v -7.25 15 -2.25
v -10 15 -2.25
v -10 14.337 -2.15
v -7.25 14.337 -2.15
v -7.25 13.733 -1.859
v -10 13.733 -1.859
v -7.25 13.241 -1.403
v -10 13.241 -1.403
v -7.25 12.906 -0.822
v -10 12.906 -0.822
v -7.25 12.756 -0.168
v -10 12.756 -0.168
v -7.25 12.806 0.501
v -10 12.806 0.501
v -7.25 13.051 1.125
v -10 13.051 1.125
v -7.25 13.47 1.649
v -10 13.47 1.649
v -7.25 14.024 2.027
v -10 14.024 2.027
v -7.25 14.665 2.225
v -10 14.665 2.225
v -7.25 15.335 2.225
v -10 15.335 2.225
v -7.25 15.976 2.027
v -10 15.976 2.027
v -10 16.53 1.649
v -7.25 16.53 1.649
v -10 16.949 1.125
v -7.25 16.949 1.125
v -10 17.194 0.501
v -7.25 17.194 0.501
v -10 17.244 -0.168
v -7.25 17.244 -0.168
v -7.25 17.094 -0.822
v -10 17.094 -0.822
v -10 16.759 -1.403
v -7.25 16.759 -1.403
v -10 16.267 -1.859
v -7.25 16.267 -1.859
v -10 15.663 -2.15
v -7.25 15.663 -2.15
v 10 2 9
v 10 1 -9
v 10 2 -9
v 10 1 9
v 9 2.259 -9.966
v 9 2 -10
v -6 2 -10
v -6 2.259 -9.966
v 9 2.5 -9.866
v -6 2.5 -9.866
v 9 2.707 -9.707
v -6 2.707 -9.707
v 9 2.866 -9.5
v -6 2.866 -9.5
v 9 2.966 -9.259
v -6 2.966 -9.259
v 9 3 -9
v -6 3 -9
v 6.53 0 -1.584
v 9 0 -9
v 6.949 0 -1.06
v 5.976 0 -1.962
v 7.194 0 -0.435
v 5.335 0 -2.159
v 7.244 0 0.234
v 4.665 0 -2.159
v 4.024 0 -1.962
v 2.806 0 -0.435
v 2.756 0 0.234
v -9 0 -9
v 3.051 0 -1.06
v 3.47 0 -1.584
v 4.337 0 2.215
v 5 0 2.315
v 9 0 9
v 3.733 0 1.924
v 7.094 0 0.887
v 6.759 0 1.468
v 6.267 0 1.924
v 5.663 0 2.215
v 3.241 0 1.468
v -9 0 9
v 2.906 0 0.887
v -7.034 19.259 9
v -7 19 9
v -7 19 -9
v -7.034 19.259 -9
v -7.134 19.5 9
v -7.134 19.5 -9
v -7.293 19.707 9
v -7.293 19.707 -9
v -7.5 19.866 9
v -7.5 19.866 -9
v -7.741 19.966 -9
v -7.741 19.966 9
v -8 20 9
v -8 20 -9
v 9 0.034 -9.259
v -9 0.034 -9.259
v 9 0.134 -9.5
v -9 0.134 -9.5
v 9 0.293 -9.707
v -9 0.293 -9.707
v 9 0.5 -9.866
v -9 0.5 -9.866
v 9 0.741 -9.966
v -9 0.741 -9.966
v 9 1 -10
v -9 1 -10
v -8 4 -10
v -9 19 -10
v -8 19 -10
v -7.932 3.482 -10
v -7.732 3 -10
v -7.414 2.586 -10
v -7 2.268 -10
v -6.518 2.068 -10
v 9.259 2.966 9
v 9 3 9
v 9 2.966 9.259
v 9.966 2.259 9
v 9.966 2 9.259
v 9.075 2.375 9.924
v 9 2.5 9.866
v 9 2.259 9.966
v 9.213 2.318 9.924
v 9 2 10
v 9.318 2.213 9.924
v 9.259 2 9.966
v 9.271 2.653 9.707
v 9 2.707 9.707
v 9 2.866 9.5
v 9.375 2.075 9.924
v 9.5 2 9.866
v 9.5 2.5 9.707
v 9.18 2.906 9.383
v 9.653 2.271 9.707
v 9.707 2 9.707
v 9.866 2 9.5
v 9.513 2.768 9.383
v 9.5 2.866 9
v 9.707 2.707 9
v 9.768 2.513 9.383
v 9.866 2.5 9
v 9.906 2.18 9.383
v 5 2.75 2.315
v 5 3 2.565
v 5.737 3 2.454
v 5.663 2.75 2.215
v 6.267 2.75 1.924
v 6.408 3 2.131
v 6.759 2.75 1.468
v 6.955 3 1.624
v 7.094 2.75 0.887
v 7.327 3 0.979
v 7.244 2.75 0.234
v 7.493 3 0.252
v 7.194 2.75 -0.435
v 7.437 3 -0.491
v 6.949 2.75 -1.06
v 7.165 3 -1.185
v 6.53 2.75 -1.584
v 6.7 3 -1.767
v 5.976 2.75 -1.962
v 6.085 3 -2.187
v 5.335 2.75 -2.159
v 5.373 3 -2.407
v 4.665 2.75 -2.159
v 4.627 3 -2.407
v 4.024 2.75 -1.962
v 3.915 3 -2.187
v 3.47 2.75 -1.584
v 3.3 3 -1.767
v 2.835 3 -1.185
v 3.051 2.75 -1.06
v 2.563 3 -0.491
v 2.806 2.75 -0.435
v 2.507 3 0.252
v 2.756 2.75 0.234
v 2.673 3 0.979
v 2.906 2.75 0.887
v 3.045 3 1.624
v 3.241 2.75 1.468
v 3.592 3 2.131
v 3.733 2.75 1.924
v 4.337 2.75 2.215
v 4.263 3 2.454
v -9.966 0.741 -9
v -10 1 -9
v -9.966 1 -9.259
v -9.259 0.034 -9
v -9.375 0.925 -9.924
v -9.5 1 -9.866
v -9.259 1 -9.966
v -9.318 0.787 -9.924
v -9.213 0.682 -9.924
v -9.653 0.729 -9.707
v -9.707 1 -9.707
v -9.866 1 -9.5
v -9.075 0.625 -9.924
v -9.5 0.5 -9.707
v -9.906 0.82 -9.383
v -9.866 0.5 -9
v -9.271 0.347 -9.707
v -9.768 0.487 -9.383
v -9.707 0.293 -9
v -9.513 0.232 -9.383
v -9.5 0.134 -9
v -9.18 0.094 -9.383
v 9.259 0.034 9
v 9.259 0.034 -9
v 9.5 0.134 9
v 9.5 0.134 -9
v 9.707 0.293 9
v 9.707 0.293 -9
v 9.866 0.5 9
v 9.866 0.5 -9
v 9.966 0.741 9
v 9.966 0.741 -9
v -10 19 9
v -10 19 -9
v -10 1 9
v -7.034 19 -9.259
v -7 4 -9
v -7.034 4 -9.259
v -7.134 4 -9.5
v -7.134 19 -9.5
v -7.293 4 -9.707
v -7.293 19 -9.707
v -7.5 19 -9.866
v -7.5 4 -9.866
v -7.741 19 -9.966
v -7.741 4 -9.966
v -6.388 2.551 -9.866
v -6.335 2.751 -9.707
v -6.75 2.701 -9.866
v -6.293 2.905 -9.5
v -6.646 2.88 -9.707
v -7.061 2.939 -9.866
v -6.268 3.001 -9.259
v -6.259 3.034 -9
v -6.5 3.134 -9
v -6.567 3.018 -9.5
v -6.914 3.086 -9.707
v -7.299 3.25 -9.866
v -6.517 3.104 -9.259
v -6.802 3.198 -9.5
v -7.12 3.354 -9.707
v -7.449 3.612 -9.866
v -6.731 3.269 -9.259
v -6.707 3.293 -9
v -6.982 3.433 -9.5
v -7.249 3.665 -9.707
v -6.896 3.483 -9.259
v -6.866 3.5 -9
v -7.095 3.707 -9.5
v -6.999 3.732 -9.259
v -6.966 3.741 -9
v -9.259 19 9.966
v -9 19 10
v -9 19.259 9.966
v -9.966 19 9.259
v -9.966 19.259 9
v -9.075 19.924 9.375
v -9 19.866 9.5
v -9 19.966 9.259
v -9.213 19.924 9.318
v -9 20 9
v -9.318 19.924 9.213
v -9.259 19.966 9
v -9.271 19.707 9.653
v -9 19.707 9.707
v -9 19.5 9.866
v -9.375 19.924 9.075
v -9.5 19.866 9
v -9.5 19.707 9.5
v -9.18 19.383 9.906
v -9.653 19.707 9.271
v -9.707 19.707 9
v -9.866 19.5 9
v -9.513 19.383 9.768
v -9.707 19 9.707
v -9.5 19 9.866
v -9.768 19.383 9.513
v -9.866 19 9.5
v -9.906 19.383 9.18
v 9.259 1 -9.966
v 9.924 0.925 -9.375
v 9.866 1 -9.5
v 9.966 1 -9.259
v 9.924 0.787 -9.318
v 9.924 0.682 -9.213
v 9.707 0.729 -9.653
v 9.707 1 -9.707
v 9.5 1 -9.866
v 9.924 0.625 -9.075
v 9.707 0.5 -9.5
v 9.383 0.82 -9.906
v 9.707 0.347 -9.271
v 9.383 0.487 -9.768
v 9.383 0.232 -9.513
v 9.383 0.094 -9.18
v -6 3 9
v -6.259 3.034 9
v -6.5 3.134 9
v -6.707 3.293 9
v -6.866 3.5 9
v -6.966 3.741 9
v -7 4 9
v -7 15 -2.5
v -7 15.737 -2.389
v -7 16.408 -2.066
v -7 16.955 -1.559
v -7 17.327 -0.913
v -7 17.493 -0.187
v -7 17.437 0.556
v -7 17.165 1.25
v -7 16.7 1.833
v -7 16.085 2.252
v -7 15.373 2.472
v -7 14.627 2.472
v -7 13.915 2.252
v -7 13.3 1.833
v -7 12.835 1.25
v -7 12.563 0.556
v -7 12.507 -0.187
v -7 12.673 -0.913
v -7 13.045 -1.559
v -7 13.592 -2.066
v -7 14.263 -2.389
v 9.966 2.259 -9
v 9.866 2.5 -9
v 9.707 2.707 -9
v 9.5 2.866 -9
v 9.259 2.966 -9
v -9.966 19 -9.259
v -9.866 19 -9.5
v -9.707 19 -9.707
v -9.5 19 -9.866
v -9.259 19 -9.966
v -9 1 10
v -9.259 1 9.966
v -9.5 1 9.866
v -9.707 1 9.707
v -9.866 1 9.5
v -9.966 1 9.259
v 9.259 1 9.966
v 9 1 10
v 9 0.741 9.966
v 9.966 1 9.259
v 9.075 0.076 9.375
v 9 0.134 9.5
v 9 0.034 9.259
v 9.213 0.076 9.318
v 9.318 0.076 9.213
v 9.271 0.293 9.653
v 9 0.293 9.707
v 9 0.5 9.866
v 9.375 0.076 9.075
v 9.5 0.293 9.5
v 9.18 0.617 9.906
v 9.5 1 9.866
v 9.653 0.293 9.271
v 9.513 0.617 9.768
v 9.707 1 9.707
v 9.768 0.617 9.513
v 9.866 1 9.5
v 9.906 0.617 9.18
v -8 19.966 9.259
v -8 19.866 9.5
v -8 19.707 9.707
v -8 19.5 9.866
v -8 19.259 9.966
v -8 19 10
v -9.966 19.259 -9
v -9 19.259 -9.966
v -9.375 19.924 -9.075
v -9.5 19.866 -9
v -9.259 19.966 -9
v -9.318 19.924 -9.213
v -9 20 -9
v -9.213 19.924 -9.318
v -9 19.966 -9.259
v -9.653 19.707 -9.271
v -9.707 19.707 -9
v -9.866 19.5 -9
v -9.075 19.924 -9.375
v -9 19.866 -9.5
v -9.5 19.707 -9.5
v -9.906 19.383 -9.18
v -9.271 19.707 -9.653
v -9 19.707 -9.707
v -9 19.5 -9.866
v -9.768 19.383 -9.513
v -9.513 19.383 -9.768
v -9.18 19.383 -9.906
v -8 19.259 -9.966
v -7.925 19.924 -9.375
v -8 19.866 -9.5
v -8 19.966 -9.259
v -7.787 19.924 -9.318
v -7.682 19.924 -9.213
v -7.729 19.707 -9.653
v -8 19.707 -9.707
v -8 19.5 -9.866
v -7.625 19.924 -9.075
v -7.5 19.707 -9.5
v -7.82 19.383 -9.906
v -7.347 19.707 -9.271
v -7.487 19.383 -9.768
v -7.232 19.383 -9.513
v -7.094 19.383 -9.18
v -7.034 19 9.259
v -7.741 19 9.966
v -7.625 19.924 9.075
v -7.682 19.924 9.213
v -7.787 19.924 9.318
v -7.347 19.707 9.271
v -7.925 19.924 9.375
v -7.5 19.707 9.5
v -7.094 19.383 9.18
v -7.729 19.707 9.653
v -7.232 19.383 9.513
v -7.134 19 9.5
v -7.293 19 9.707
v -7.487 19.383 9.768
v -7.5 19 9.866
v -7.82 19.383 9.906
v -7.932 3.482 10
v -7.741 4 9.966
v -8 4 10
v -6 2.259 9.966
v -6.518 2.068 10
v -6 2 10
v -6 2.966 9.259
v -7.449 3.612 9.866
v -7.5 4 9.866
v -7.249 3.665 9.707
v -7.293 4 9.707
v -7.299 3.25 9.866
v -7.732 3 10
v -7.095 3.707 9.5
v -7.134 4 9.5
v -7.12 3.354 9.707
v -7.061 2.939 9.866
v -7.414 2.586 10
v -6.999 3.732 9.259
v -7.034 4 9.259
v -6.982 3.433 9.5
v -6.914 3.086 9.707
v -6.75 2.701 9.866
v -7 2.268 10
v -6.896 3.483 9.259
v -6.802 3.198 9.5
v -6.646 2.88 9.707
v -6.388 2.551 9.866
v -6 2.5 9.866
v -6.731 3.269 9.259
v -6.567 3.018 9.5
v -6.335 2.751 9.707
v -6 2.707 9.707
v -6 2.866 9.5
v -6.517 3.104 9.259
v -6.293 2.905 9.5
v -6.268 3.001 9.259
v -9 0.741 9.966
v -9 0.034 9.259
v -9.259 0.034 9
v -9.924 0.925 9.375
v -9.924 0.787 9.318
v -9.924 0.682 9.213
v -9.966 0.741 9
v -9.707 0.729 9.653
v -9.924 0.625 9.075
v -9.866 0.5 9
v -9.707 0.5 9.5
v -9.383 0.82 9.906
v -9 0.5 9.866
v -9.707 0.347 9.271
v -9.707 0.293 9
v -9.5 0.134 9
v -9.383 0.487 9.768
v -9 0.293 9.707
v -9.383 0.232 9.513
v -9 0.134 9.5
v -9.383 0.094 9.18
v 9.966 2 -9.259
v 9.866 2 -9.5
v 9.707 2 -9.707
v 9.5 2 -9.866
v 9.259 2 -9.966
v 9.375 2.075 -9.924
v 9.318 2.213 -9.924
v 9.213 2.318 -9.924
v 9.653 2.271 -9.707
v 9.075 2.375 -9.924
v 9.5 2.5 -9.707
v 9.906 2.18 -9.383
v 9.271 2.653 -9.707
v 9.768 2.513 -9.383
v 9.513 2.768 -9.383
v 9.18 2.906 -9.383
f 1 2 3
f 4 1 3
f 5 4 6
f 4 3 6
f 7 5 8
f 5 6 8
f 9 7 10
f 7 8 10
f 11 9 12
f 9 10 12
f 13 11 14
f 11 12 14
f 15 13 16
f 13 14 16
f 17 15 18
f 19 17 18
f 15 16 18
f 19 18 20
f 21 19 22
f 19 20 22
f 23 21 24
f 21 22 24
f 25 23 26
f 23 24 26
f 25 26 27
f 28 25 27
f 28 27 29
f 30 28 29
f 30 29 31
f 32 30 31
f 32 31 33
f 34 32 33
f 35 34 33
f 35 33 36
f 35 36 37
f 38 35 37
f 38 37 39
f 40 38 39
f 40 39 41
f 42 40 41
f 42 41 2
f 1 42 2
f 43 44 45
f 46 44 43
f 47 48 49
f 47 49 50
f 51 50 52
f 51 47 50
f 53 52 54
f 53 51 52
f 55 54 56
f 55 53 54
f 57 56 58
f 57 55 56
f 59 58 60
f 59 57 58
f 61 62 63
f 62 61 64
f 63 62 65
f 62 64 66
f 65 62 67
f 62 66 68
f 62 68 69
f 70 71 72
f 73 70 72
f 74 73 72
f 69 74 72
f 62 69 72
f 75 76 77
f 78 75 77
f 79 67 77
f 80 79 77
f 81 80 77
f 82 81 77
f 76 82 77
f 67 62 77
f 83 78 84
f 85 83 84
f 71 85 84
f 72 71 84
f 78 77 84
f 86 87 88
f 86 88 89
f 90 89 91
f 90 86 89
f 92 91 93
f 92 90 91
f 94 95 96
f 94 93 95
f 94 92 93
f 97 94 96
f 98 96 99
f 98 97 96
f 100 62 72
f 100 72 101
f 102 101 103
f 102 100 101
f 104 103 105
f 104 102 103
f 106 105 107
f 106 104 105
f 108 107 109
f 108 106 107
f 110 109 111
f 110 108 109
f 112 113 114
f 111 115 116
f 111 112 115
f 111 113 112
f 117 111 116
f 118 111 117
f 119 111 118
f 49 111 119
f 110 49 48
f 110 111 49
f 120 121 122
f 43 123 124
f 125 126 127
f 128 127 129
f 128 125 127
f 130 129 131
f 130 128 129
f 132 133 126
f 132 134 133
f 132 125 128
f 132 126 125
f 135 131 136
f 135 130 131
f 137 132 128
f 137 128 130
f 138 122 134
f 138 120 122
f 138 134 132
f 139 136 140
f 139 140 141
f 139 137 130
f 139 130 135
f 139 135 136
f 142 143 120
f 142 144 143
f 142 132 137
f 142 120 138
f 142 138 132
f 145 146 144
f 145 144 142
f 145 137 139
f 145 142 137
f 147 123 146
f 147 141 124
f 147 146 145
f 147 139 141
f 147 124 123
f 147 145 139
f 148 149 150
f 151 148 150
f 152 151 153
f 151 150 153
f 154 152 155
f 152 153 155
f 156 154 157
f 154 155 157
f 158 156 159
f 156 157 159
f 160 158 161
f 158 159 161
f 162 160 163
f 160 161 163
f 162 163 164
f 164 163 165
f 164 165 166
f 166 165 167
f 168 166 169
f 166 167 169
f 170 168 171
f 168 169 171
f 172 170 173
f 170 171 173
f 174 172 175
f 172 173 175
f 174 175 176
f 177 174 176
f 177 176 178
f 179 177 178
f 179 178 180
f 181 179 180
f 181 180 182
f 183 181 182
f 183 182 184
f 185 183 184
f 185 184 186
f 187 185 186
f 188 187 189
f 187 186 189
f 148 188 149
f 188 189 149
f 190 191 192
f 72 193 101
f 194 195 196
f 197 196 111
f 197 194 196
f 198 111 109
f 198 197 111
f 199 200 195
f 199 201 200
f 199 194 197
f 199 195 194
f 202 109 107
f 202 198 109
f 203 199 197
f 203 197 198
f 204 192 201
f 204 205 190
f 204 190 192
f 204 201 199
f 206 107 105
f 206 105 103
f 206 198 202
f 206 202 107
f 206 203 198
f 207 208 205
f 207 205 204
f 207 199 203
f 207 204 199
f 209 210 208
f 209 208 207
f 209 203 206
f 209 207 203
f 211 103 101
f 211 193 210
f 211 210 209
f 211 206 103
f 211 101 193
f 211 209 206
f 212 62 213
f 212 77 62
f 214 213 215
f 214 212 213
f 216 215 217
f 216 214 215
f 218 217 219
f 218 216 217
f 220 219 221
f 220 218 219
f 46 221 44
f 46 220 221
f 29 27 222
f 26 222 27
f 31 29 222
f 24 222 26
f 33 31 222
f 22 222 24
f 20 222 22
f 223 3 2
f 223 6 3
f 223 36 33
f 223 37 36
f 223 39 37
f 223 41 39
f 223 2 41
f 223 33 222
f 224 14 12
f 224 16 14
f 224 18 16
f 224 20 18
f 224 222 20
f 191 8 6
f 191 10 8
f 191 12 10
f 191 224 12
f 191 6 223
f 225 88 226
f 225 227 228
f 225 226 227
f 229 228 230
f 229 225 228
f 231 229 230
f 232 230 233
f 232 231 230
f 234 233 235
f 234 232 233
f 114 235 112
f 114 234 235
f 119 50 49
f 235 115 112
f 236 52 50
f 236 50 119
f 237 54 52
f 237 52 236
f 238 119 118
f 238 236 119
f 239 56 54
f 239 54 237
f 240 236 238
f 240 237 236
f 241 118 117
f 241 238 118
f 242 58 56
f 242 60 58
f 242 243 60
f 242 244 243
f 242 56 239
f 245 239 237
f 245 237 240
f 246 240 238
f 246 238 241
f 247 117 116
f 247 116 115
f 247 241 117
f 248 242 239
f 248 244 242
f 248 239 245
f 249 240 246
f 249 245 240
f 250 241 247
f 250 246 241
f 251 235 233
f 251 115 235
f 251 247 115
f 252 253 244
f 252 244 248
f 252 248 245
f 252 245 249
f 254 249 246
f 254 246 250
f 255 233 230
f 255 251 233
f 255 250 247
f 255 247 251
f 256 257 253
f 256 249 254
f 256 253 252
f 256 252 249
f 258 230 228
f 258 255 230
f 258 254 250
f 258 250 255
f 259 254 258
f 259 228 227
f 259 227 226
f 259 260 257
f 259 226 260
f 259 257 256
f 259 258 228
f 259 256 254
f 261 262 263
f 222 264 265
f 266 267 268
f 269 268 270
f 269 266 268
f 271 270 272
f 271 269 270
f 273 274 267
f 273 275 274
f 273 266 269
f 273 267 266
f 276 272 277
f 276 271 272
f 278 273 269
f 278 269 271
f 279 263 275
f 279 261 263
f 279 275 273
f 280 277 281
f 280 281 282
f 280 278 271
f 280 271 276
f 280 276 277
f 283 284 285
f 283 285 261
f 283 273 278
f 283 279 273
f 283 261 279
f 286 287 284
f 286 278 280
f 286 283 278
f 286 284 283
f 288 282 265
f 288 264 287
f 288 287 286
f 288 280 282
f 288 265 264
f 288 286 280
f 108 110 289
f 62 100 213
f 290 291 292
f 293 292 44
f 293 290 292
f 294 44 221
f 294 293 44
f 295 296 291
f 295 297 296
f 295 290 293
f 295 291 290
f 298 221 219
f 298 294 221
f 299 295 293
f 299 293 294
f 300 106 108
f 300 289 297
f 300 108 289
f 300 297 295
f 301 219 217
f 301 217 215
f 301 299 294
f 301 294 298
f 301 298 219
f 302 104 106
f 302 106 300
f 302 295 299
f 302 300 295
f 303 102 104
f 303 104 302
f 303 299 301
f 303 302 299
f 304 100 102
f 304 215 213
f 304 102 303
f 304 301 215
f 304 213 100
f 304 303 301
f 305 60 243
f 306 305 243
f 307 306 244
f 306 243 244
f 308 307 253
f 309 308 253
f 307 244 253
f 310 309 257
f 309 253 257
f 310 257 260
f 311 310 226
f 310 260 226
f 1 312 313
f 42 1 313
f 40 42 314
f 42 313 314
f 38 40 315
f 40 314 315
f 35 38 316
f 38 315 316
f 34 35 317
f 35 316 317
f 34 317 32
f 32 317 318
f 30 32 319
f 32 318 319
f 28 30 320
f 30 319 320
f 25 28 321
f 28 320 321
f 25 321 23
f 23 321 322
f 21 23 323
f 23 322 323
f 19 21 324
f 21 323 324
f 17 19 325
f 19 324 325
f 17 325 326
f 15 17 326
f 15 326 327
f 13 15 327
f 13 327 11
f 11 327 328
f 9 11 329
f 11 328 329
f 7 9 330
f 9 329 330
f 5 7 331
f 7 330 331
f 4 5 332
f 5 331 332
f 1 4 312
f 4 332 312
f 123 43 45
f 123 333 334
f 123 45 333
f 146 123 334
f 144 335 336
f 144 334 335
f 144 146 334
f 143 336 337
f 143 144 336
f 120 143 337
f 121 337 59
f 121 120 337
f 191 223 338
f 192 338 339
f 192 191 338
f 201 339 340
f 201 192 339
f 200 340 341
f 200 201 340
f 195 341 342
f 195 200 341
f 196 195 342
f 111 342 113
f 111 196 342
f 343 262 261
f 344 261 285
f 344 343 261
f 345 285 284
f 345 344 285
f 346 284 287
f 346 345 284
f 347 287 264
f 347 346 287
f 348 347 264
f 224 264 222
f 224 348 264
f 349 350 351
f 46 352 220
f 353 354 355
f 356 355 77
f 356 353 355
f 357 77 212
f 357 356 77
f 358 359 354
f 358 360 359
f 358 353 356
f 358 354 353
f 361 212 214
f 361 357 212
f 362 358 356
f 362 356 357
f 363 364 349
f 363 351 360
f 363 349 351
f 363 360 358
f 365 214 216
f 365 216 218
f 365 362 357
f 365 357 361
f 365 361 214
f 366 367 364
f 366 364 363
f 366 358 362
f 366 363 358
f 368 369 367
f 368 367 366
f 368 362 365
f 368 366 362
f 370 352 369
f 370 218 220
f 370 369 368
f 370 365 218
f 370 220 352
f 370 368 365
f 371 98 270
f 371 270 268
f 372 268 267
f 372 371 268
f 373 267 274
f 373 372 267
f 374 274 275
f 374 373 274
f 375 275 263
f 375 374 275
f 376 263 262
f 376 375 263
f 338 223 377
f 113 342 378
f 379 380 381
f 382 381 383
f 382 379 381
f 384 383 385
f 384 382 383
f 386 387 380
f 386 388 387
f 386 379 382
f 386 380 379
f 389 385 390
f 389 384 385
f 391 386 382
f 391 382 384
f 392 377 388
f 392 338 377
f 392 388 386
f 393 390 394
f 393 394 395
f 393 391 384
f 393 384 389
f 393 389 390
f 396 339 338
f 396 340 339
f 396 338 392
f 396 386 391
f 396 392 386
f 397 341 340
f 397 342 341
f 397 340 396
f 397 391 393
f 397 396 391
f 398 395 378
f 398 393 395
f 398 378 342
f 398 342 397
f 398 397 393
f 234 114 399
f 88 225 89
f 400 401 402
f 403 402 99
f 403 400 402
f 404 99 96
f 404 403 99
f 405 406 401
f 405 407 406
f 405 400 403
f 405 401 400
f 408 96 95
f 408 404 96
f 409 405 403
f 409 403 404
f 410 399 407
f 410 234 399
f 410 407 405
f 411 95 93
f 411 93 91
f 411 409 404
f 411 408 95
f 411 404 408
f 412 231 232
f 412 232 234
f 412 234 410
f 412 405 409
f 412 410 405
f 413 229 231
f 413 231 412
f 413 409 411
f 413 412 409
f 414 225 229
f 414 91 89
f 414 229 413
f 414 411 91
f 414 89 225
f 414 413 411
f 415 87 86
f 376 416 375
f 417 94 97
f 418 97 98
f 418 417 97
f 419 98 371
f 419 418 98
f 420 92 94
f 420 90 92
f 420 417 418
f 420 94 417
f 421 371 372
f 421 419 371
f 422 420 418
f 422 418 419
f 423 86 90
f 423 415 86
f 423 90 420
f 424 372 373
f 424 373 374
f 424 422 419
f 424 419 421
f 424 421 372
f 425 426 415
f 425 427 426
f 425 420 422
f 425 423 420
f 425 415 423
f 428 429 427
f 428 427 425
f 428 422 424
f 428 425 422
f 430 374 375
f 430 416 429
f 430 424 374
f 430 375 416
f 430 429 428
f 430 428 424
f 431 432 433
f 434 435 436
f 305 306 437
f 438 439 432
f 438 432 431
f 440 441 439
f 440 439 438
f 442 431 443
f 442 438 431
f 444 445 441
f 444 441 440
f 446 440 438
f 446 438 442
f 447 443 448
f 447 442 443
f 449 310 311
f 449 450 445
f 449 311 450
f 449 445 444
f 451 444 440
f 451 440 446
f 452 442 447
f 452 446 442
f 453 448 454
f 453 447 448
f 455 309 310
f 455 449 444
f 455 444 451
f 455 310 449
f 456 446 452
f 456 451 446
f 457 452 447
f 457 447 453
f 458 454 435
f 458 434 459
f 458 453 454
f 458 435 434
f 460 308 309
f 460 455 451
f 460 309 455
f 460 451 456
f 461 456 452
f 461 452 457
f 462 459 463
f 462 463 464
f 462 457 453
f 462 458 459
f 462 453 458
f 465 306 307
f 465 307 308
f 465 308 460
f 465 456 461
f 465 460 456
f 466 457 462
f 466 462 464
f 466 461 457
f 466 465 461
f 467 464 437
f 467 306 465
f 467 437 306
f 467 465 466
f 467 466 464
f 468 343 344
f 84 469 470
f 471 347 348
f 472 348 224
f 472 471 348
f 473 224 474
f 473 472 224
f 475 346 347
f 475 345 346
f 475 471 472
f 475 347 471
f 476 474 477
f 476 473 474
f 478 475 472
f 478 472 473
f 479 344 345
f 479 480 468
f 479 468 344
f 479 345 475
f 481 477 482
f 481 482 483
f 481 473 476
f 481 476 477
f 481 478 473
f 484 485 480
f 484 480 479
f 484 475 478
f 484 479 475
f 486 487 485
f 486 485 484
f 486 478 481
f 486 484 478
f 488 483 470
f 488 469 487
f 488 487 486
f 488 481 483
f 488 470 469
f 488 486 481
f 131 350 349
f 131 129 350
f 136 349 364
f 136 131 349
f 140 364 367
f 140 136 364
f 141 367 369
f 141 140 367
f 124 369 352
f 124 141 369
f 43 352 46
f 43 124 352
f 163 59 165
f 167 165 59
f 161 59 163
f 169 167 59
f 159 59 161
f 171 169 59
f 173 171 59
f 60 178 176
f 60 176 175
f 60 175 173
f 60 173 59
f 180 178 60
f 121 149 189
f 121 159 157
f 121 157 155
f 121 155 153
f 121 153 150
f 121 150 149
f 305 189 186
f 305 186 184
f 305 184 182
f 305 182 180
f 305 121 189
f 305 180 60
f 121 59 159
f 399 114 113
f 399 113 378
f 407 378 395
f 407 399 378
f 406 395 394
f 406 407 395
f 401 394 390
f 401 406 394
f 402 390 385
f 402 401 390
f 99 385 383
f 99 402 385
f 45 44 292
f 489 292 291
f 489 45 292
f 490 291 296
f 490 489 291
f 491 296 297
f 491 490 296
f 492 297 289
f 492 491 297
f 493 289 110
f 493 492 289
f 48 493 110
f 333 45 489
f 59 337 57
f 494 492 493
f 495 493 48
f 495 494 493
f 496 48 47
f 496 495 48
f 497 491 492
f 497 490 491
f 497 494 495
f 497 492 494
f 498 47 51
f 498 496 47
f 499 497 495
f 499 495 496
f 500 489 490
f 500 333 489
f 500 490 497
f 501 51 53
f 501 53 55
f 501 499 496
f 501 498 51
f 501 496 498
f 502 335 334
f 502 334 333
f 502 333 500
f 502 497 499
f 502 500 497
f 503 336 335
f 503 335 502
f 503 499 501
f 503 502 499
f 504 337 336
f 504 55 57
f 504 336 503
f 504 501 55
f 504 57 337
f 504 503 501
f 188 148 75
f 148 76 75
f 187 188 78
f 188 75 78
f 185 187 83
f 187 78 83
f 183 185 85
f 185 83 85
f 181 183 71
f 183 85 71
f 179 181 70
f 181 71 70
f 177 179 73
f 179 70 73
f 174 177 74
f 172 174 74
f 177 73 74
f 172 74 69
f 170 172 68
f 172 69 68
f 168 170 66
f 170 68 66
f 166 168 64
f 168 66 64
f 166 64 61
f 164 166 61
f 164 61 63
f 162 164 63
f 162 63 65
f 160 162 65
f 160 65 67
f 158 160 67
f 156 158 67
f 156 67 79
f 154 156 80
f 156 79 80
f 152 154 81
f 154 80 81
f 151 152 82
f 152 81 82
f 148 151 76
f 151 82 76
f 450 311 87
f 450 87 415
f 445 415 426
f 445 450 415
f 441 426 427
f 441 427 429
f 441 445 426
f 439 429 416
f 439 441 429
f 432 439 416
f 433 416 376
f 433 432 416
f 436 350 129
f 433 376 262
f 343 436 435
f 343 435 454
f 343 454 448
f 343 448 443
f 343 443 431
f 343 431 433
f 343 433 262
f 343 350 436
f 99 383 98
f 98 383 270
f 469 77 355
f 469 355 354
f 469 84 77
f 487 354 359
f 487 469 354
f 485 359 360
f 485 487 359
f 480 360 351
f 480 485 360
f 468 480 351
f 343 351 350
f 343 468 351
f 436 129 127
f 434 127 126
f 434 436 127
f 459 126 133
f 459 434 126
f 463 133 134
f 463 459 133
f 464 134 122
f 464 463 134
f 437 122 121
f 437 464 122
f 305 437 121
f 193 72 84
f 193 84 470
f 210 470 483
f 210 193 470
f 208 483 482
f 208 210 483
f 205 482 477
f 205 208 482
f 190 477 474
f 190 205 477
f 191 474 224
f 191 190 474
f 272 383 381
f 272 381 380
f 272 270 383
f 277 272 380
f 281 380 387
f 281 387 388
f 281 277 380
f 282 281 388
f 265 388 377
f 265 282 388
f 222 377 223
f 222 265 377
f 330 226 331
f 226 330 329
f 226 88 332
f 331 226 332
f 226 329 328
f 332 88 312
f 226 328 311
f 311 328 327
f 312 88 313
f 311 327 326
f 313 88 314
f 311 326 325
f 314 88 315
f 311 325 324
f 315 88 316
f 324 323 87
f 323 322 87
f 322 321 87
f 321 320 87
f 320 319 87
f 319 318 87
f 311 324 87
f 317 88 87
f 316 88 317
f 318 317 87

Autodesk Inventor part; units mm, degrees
ref_plane "YZ Plane" through (0, 0, 0) normal (1, 0, 0) x (0, 1, 0)
ref_plane "XZ Plane" through (0, 0, 0) normal (0, 1, 0) x (-1, 0, 0)
ref_plane "XY Plane" through (0, 0, 0) normal (0, 0, 1) x (1, 0, 0)
sketch "Esquisse1" plane through (0, 0, 0) normal (0, 1, 0) x (-1, 0, 0)
  line L0 (-10, 10) -> (10, 10)
  line L1 (10, 10) -> (10, -10)
  line L2 (10, -10) -> (-10, -10)
  line L3 (-10, -10) -> (-10, 10)
  line L4 (-10, 10) -> (10, -10) construction
  line L5 (10, 10) -> (-10, -10) construction
  point P0 (0, 0)
  dimension "d0" = 20
  dimension "d1" = 20
extrude "Extrusion1" add sketch "Esquisse1" along normal blind 3
sketch "Esquisse2" plane through (-10, 0, -10) normal (-1, 0, 0) x (0, 0, 1)
  line L0 (0, 20) -> (20, 20)
  line L1 (20, 20) -> (20, 3)
  line L2 (20, 3) -> (0, 3)
  line L3 (0, 3) -> (0, 20)
  line L4 (0, 20) -> (20, 3) construction
  line L5 (20, 20) -> (0, 3) construction
  line L6 (0, 0) -> (20, 0) projected
  point P0 (10, 0)
  point P1 (10, 11.5)
  dimension "d4" = 20
  dimension "d5" = 17
  dimension "d6" = 3
extrude "Extrusion2" add sketch "Esquisse2" against normal blind 3
fillet "Congé1" radius 1 18 edges at (10, 3, 0) (1.5, 3, 10) (10, 1.5, 10) (-7, 11.5, 10) (0, 0, 10) (-10, 10, 10) (-10, 0, 0) (-10, 10, -10) (0, 0, -10) (1.5, 3, -10) (-7, 11.5, -10) (10, 1.5, -10) (10, 0, 0) (-7, 3, 0) (-7, 20, 0) (-10, 20, 0) (-8.5, 20, 10) (-8.5, 20, -10)
sketch "Esquisse3" plane through (0, 3, 0) normal (0, 1, 0) x (1, 0, 0)
  line L0 (10, -9) -> (10, 9) projected
  point P0 (0, 0)
  point P1 (5, -0.0654)
  dimension "d24" = 5
hole "Perçage1" at (5, 3, 0.0654) direction (0, -1, 0) diameter 4.5 depth 16.2 tip angle 118 countersink diameter 5 countersink angle 90 clearance for "Vis à tête plate fraisée ISO 2009/7046" size "M4" standard "ISO"
sketch "Esquisse4" plane through (-7, 0, -10) normal (1, 0, 0) x (0, 0, -1)
  line L0 (-1, 20) -> (-19, 20) projected
  line L1 (-20, 19) -> (-20, 4) projected
  point P0 (-10, 0)
  point P1 (-10, 15)
  dimension "d25" = 5
  dimension "d26" = 10
hole "Perçage2" at (-7, 15, 0) direction (-1, 0, 0) diameter 4.5 depth 16.2 tip angle 118 countersink diameter 5 countersink angle 90 clearance for "Vis à tête plate fraisée ISO 2009/7046" size "M4" standard "ISO"
properties part number "Aquerre"
